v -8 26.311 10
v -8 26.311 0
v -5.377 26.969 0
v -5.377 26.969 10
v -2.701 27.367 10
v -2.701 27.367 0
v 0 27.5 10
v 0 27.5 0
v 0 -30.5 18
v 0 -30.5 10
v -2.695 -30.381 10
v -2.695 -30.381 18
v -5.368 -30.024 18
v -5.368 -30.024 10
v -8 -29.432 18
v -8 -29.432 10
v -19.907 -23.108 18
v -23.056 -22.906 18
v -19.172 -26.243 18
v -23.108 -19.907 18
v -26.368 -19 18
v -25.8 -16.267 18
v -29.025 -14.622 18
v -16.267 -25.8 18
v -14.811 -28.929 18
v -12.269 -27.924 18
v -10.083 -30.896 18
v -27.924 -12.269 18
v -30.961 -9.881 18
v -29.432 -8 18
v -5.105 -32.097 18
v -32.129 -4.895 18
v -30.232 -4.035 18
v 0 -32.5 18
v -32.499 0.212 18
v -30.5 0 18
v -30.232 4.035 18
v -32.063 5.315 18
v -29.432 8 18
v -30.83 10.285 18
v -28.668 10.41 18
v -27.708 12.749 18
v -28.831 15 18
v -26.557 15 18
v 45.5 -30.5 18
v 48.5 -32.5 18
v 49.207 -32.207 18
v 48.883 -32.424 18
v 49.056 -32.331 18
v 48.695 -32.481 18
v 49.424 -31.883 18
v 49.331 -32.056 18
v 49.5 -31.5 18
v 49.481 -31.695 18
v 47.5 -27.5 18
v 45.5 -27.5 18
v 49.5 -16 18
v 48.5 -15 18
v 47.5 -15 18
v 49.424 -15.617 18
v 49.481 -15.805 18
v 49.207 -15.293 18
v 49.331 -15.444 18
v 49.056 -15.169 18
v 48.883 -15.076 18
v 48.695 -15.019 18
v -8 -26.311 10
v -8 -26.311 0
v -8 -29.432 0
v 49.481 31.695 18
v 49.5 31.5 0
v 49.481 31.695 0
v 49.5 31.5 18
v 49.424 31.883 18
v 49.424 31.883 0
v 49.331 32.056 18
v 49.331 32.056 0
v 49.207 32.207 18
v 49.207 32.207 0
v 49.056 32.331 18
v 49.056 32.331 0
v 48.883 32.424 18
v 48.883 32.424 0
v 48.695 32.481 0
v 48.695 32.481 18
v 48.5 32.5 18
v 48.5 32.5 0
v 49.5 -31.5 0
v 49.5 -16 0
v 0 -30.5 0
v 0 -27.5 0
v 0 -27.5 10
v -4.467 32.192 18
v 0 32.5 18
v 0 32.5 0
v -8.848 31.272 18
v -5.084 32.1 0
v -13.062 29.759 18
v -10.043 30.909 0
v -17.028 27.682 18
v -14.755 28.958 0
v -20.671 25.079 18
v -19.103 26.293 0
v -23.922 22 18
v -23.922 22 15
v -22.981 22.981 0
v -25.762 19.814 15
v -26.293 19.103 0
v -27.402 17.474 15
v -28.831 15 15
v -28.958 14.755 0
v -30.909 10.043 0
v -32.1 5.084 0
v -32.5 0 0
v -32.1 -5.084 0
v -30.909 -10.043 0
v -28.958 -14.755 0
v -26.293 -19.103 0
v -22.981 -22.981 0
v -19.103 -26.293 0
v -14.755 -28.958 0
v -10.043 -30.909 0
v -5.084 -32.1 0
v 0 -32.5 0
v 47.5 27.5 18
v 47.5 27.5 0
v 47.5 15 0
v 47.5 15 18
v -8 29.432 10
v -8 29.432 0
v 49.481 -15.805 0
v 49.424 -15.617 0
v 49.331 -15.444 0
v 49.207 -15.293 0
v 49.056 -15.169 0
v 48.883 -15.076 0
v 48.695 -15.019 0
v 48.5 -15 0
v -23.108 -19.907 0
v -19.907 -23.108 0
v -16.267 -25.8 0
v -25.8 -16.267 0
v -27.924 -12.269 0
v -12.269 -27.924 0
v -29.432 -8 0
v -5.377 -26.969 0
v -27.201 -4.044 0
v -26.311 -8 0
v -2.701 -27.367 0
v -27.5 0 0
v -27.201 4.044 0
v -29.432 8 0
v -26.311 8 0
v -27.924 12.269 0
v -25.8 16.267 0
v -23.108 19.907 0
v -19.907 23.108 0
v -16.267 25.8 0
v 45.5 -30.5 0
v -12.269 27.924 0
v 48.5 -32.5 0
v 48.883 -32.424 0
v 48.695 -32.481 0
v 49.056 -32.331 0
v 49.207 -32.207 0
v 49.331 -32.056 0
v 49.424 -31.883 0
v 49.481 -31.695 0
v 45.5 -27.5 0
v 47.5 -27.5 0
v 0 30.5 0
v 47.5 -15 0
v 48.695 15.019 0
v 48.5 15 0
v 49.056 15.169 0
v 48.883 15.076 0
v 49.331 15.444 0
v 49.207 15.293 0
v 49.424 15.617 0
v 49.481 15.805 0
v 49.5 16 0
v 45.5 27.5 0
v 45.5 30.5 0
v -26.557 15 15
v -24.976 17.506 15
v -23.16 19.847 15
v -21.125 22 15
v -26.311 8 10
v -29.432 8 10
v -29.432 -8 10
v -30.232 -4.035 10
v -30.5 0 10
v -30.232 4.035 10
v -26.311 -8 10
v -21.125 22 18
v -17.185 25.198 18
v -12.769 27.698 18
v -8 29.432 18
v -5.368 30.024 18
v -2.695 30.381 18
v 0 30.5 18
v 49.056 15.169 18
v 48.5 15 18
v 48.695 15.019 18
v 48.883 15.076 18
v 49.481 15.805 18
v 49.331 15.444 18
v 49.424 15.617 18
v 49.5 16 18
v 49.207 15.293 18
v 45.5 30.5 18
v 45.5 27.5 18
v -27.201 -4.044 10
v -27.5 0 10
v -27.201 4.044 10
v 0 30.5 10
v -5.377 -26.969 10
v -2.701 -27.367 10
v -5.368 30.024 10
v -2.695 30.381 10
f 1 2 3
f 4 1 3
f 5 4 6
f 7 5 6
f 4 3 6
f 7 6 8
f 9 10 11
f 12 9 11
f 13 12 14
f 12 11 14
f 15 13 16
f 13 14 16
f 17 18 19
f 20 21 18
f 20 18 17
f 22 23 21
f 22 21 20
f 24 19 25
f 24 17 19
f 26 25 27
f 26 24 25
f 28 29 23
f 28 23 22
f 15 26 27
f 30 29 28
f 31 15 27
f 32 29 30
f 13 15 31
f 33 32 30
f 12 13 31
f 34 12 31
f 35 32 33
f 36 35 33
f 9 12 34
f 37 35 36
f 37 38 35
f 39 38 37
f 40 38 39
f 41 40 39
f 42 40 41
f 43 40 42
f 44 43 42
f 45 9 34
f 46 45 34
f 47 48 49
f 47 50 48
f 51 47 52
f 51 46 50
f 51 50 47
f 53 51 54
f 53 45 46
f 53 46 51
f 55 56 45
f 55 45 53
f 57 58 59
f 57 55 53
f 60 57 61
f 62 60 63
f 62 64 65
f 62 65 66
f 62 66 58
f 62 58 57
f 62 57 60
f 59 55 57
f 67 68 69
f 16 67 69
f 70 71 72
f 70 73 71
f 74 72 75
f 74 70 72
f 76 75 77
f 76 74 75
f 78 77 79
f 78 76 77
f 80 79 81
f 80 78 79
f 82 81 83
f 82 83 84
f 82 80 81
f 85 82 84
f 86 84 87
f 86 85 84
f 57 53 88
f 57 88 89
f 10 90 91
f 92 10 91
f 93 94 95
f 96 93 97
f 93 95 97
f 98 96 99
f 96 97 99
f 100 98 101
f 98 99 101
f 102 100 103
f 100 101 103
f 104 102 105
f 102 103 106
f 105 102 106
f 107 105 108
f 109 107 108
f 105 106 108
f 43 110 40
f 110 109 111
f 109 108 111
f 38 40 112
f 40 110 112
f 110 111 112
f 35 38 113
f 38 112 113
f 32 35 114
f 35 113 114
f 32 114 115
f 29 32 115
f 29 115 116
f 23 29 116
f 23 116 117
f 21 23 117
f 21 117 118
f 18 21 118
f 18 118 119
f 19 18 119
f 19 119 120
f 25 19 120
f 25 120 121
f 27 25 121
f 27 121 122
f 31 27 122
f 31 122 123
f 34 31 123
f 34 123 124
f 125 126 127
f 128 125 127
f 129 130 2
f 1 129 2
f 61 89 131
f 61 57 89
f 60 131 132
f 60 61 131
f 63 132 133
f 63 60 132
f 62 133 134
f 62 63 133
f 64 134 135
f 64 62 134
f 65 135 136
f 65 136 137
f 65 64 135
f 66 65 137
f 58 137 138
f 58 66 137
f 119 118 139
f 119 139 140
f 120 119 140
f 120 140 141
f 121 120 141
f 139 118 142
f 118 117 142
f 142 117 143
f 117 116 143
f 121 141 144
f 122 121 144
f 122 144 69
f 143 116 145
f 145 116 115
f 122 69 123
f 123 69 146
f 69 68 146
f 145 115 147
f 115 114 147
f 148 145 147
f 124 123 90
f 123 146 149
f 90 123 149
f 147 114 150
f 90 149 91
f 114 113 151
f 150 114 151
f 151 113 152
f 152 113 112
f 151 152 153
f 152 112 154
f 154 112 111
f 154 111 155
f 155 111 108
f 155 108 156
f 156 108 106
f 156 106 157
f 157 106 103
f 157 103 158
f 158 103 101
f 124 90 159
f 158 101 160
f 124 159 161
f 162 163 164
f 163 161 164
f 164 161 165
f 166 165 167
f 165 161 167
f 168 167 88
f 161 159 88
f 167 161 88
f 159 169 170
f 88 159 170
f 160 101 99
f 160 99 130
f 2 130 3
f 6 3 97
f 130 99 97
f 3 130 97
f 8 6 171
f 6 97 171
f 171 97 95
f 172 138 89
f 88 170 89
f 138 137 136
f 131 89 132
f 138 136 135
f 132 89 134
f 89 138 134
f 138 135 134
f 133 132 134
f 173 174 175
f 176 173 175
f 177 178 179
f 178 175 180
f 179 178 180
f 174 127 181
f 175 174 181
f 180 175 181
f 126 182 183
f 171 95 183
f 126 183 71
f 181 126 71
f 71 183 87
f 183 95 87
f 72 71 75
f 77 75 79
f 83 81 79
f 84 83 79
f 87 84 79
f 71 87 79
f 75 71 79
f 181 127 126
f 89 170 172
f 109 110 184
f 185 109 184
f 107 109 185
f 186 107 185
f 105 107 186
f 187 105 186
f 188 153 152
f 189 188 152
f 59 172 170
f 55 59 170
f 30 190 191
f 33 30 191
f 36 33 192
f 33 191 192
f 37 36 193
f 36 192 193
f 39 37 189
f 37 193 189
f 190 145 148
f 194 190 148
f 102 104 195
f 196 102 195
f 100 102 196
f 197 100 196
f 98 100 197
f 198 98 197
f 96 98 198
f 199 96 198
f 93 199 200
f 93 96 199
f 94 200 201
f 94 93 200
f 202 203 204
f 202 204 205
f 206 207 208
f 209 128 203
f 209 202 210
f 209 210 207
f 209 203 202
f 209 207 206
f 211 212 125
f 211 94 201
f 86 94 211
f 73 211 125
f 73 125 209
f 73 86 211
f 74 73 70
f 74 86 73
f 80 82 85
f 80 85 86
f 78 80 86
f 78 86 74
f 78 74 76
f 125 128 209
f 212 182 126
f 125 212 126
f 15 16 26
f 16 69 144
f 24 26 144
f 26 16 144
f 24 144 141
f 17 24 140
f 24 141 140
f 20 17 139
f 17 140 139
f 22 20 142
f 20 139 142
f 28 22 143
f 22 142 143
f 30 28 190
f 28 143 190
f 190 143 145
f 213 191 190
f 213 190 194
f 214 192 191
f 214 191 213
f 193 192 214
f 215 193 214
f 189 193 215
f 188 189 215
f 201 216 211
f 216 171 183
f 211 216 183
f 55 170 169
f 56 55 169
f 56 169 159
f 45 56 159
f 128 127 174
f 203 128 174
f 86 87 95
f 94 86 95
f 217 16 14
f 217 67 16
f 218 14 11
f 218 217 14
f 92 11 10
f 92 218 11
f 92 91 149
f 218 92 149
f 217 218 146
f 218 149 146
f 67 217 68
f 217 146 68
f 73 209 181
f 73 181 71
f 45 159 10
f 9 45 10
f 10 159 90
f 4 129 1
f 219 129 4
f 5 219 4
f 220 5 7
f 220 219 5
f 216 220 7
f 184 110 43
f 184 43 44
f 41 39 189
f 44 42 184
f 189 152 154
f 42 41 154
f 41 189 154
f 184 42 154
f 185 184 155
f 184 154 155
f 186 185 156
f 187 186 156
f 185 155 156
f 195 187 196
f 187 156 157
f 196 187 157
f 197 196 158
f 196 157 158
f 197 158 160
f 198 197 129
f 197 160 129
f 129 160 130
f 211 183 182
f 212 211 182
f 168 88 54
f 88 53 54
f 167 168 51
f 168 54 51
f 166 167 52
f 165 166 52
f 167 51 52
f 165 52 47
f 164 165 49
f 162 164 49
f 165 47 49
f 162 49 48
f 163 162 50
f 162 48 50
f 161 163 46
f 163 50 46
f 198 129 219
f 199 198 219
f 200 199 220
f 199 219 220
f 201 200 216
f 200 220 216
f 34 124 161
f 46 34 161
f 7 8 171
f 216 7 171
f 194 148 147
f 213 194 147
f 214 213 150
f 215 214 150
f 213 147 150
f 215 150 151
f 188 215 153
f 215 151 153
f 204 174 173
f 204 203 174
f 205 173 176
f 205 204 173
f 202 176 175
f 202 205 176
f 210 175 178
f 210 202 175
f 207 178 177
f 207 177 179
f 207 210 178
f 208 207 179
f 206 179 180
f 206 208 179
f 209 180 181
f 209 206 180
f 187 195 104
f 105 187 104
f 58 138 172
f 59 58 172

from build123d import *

# Parameters (mm, degrees)
F1_DEPTH = 18
F2_R     = 1
F3_DEPTH = 10
F5_DEPTH = 3


with BuildPart() as f1:
    # F0 (on Top) → F1 (new body)
    with BuildSketch(Plane.XY):
        with BuildLine():
            Line((49.5, -32.5), (49.5, -15))
            Line((49.5, -15), (47.5, -15))
            Line((47.5, -15), (47.5, -27.5))
            Line((47.5, -27.5), (45.5, -27.5))
            Line((45.5, -27.5), (45.5, -30.5))
            Line((45.5, -30.5), (0, -30.5))
            ThreePointArc((0, -30.5), (-4.0354787933, -30.2318525881), (-8, -29.4321253055))
            ThreePointArc((-8, -29.4321253055), (-21.5667568262, -21.5667568262), (-29.4321253055, -8))
            ThreePointArc((-29.4321253055, -8), (-30.5, 0), (-29.4321253055, 8))
            ThreePointArc((-29.4321253055, 8), (-21.5667568262, 21.5667568262), (-8, 29.4321253055))
            ThreePointArc((-8, 29.4321253055), (-4.0354787933, 30.2318525881), (0, 30.5))
            Line((0, 30.5), (45.5, 30.5))
            Line((45.5, 30.5), (45.5, 27.5))
            Line((45.5, 27.5), (47.5, 27.5))
            Line((47.5, 27.5), (47.5, 15))
            Line((47.5, 15), (49.5, 15))
            Line((49.5, 15), (49.5, 32.5))
            Line((49.5, 32.5), (0, 32.5))
            ThreePointArc((0, 32.5), (-32.5, 0), (0, -32.5))
            Line((0, -32.5), (49.5, -32.5))
        make_face()
    extrude(amount=F1_DEPTH)

    # F2
    f2_edges = [f1.edges().sort_by_distance(p)[0] for p in [
        (49.5, 15, 9),
        (49.5, -15, 9),
        (49.5, 32.5, 9),
        (49.5, -32.5, 9),
    ]]
    fillet(f2_edges, radius=F2_R)

    # F0 (on Top) → F3 (join)
    with BuildSketch(Plane.XY):
        with BuildLine():
            ThreePointArc((0, 30.5), (-4.0354787933, 30.2318525881), (-8, 29.4321253055))
            Line((-8, 29.4321253055), (-8, 26.3106442338))
            ThreePointArc((-8, 26.3106442338), (-4.0439636231, 27.2010359769), (0, 27.5))
            Line((0, 27.5), (0, 30.5))
        make_face()
        with BuildLine():
            ThreePointArc((-29.4321253055, 8), (-30.5, 0), (-29.4321253055, -8))
            Line((-29.4321253055, -8), (-26.3106442338, -8))
            ThreePointArc((-26.3106442338, -8), (-27.5, 0), (-26.3106442338, 8))
            Line((-26.3106442338, 8), (-29.4321253055, 8))
        make_face()
        with BuildLine():
            ThreePointArc((-8, -29.4321253055), (-4.0354787933, -30.2318525881), (0, -30.5))
            Line((0, -30.5), (0, -27.5))
            ThreePointArc((0, -27.5), (-4.0439636231, -27.2010359769), (-8, -26.3106442338))
            Line((-8, -26.3106442338), (-8, -29.4321253055))
        make_face()
    extrude(amount=F3_DEPTH)

    # F4 (on face) → F5 (cut)
    with BuildSketch(Plane.XY.offset(18)):
        with BuildLine():
            Line((-28.8314064867, 15), (-26.5565434498, 15))
            ThreePointArc((-26.5565434498, 15), (-24.0961320452, 18.698299935), (-21.1246301743, 22))
            Line((-21.1246301743, 22), (-23.9217474278, 22))
            ThreePointArc((-23.9217474278, 22), (-26.6077772837, 18.6621592539), (-28.8314064867, 15))
        make_face()
    extrude(amount=-F5_DEPTH, mode=Mode.SUBTRACT)


solid = f1.part
